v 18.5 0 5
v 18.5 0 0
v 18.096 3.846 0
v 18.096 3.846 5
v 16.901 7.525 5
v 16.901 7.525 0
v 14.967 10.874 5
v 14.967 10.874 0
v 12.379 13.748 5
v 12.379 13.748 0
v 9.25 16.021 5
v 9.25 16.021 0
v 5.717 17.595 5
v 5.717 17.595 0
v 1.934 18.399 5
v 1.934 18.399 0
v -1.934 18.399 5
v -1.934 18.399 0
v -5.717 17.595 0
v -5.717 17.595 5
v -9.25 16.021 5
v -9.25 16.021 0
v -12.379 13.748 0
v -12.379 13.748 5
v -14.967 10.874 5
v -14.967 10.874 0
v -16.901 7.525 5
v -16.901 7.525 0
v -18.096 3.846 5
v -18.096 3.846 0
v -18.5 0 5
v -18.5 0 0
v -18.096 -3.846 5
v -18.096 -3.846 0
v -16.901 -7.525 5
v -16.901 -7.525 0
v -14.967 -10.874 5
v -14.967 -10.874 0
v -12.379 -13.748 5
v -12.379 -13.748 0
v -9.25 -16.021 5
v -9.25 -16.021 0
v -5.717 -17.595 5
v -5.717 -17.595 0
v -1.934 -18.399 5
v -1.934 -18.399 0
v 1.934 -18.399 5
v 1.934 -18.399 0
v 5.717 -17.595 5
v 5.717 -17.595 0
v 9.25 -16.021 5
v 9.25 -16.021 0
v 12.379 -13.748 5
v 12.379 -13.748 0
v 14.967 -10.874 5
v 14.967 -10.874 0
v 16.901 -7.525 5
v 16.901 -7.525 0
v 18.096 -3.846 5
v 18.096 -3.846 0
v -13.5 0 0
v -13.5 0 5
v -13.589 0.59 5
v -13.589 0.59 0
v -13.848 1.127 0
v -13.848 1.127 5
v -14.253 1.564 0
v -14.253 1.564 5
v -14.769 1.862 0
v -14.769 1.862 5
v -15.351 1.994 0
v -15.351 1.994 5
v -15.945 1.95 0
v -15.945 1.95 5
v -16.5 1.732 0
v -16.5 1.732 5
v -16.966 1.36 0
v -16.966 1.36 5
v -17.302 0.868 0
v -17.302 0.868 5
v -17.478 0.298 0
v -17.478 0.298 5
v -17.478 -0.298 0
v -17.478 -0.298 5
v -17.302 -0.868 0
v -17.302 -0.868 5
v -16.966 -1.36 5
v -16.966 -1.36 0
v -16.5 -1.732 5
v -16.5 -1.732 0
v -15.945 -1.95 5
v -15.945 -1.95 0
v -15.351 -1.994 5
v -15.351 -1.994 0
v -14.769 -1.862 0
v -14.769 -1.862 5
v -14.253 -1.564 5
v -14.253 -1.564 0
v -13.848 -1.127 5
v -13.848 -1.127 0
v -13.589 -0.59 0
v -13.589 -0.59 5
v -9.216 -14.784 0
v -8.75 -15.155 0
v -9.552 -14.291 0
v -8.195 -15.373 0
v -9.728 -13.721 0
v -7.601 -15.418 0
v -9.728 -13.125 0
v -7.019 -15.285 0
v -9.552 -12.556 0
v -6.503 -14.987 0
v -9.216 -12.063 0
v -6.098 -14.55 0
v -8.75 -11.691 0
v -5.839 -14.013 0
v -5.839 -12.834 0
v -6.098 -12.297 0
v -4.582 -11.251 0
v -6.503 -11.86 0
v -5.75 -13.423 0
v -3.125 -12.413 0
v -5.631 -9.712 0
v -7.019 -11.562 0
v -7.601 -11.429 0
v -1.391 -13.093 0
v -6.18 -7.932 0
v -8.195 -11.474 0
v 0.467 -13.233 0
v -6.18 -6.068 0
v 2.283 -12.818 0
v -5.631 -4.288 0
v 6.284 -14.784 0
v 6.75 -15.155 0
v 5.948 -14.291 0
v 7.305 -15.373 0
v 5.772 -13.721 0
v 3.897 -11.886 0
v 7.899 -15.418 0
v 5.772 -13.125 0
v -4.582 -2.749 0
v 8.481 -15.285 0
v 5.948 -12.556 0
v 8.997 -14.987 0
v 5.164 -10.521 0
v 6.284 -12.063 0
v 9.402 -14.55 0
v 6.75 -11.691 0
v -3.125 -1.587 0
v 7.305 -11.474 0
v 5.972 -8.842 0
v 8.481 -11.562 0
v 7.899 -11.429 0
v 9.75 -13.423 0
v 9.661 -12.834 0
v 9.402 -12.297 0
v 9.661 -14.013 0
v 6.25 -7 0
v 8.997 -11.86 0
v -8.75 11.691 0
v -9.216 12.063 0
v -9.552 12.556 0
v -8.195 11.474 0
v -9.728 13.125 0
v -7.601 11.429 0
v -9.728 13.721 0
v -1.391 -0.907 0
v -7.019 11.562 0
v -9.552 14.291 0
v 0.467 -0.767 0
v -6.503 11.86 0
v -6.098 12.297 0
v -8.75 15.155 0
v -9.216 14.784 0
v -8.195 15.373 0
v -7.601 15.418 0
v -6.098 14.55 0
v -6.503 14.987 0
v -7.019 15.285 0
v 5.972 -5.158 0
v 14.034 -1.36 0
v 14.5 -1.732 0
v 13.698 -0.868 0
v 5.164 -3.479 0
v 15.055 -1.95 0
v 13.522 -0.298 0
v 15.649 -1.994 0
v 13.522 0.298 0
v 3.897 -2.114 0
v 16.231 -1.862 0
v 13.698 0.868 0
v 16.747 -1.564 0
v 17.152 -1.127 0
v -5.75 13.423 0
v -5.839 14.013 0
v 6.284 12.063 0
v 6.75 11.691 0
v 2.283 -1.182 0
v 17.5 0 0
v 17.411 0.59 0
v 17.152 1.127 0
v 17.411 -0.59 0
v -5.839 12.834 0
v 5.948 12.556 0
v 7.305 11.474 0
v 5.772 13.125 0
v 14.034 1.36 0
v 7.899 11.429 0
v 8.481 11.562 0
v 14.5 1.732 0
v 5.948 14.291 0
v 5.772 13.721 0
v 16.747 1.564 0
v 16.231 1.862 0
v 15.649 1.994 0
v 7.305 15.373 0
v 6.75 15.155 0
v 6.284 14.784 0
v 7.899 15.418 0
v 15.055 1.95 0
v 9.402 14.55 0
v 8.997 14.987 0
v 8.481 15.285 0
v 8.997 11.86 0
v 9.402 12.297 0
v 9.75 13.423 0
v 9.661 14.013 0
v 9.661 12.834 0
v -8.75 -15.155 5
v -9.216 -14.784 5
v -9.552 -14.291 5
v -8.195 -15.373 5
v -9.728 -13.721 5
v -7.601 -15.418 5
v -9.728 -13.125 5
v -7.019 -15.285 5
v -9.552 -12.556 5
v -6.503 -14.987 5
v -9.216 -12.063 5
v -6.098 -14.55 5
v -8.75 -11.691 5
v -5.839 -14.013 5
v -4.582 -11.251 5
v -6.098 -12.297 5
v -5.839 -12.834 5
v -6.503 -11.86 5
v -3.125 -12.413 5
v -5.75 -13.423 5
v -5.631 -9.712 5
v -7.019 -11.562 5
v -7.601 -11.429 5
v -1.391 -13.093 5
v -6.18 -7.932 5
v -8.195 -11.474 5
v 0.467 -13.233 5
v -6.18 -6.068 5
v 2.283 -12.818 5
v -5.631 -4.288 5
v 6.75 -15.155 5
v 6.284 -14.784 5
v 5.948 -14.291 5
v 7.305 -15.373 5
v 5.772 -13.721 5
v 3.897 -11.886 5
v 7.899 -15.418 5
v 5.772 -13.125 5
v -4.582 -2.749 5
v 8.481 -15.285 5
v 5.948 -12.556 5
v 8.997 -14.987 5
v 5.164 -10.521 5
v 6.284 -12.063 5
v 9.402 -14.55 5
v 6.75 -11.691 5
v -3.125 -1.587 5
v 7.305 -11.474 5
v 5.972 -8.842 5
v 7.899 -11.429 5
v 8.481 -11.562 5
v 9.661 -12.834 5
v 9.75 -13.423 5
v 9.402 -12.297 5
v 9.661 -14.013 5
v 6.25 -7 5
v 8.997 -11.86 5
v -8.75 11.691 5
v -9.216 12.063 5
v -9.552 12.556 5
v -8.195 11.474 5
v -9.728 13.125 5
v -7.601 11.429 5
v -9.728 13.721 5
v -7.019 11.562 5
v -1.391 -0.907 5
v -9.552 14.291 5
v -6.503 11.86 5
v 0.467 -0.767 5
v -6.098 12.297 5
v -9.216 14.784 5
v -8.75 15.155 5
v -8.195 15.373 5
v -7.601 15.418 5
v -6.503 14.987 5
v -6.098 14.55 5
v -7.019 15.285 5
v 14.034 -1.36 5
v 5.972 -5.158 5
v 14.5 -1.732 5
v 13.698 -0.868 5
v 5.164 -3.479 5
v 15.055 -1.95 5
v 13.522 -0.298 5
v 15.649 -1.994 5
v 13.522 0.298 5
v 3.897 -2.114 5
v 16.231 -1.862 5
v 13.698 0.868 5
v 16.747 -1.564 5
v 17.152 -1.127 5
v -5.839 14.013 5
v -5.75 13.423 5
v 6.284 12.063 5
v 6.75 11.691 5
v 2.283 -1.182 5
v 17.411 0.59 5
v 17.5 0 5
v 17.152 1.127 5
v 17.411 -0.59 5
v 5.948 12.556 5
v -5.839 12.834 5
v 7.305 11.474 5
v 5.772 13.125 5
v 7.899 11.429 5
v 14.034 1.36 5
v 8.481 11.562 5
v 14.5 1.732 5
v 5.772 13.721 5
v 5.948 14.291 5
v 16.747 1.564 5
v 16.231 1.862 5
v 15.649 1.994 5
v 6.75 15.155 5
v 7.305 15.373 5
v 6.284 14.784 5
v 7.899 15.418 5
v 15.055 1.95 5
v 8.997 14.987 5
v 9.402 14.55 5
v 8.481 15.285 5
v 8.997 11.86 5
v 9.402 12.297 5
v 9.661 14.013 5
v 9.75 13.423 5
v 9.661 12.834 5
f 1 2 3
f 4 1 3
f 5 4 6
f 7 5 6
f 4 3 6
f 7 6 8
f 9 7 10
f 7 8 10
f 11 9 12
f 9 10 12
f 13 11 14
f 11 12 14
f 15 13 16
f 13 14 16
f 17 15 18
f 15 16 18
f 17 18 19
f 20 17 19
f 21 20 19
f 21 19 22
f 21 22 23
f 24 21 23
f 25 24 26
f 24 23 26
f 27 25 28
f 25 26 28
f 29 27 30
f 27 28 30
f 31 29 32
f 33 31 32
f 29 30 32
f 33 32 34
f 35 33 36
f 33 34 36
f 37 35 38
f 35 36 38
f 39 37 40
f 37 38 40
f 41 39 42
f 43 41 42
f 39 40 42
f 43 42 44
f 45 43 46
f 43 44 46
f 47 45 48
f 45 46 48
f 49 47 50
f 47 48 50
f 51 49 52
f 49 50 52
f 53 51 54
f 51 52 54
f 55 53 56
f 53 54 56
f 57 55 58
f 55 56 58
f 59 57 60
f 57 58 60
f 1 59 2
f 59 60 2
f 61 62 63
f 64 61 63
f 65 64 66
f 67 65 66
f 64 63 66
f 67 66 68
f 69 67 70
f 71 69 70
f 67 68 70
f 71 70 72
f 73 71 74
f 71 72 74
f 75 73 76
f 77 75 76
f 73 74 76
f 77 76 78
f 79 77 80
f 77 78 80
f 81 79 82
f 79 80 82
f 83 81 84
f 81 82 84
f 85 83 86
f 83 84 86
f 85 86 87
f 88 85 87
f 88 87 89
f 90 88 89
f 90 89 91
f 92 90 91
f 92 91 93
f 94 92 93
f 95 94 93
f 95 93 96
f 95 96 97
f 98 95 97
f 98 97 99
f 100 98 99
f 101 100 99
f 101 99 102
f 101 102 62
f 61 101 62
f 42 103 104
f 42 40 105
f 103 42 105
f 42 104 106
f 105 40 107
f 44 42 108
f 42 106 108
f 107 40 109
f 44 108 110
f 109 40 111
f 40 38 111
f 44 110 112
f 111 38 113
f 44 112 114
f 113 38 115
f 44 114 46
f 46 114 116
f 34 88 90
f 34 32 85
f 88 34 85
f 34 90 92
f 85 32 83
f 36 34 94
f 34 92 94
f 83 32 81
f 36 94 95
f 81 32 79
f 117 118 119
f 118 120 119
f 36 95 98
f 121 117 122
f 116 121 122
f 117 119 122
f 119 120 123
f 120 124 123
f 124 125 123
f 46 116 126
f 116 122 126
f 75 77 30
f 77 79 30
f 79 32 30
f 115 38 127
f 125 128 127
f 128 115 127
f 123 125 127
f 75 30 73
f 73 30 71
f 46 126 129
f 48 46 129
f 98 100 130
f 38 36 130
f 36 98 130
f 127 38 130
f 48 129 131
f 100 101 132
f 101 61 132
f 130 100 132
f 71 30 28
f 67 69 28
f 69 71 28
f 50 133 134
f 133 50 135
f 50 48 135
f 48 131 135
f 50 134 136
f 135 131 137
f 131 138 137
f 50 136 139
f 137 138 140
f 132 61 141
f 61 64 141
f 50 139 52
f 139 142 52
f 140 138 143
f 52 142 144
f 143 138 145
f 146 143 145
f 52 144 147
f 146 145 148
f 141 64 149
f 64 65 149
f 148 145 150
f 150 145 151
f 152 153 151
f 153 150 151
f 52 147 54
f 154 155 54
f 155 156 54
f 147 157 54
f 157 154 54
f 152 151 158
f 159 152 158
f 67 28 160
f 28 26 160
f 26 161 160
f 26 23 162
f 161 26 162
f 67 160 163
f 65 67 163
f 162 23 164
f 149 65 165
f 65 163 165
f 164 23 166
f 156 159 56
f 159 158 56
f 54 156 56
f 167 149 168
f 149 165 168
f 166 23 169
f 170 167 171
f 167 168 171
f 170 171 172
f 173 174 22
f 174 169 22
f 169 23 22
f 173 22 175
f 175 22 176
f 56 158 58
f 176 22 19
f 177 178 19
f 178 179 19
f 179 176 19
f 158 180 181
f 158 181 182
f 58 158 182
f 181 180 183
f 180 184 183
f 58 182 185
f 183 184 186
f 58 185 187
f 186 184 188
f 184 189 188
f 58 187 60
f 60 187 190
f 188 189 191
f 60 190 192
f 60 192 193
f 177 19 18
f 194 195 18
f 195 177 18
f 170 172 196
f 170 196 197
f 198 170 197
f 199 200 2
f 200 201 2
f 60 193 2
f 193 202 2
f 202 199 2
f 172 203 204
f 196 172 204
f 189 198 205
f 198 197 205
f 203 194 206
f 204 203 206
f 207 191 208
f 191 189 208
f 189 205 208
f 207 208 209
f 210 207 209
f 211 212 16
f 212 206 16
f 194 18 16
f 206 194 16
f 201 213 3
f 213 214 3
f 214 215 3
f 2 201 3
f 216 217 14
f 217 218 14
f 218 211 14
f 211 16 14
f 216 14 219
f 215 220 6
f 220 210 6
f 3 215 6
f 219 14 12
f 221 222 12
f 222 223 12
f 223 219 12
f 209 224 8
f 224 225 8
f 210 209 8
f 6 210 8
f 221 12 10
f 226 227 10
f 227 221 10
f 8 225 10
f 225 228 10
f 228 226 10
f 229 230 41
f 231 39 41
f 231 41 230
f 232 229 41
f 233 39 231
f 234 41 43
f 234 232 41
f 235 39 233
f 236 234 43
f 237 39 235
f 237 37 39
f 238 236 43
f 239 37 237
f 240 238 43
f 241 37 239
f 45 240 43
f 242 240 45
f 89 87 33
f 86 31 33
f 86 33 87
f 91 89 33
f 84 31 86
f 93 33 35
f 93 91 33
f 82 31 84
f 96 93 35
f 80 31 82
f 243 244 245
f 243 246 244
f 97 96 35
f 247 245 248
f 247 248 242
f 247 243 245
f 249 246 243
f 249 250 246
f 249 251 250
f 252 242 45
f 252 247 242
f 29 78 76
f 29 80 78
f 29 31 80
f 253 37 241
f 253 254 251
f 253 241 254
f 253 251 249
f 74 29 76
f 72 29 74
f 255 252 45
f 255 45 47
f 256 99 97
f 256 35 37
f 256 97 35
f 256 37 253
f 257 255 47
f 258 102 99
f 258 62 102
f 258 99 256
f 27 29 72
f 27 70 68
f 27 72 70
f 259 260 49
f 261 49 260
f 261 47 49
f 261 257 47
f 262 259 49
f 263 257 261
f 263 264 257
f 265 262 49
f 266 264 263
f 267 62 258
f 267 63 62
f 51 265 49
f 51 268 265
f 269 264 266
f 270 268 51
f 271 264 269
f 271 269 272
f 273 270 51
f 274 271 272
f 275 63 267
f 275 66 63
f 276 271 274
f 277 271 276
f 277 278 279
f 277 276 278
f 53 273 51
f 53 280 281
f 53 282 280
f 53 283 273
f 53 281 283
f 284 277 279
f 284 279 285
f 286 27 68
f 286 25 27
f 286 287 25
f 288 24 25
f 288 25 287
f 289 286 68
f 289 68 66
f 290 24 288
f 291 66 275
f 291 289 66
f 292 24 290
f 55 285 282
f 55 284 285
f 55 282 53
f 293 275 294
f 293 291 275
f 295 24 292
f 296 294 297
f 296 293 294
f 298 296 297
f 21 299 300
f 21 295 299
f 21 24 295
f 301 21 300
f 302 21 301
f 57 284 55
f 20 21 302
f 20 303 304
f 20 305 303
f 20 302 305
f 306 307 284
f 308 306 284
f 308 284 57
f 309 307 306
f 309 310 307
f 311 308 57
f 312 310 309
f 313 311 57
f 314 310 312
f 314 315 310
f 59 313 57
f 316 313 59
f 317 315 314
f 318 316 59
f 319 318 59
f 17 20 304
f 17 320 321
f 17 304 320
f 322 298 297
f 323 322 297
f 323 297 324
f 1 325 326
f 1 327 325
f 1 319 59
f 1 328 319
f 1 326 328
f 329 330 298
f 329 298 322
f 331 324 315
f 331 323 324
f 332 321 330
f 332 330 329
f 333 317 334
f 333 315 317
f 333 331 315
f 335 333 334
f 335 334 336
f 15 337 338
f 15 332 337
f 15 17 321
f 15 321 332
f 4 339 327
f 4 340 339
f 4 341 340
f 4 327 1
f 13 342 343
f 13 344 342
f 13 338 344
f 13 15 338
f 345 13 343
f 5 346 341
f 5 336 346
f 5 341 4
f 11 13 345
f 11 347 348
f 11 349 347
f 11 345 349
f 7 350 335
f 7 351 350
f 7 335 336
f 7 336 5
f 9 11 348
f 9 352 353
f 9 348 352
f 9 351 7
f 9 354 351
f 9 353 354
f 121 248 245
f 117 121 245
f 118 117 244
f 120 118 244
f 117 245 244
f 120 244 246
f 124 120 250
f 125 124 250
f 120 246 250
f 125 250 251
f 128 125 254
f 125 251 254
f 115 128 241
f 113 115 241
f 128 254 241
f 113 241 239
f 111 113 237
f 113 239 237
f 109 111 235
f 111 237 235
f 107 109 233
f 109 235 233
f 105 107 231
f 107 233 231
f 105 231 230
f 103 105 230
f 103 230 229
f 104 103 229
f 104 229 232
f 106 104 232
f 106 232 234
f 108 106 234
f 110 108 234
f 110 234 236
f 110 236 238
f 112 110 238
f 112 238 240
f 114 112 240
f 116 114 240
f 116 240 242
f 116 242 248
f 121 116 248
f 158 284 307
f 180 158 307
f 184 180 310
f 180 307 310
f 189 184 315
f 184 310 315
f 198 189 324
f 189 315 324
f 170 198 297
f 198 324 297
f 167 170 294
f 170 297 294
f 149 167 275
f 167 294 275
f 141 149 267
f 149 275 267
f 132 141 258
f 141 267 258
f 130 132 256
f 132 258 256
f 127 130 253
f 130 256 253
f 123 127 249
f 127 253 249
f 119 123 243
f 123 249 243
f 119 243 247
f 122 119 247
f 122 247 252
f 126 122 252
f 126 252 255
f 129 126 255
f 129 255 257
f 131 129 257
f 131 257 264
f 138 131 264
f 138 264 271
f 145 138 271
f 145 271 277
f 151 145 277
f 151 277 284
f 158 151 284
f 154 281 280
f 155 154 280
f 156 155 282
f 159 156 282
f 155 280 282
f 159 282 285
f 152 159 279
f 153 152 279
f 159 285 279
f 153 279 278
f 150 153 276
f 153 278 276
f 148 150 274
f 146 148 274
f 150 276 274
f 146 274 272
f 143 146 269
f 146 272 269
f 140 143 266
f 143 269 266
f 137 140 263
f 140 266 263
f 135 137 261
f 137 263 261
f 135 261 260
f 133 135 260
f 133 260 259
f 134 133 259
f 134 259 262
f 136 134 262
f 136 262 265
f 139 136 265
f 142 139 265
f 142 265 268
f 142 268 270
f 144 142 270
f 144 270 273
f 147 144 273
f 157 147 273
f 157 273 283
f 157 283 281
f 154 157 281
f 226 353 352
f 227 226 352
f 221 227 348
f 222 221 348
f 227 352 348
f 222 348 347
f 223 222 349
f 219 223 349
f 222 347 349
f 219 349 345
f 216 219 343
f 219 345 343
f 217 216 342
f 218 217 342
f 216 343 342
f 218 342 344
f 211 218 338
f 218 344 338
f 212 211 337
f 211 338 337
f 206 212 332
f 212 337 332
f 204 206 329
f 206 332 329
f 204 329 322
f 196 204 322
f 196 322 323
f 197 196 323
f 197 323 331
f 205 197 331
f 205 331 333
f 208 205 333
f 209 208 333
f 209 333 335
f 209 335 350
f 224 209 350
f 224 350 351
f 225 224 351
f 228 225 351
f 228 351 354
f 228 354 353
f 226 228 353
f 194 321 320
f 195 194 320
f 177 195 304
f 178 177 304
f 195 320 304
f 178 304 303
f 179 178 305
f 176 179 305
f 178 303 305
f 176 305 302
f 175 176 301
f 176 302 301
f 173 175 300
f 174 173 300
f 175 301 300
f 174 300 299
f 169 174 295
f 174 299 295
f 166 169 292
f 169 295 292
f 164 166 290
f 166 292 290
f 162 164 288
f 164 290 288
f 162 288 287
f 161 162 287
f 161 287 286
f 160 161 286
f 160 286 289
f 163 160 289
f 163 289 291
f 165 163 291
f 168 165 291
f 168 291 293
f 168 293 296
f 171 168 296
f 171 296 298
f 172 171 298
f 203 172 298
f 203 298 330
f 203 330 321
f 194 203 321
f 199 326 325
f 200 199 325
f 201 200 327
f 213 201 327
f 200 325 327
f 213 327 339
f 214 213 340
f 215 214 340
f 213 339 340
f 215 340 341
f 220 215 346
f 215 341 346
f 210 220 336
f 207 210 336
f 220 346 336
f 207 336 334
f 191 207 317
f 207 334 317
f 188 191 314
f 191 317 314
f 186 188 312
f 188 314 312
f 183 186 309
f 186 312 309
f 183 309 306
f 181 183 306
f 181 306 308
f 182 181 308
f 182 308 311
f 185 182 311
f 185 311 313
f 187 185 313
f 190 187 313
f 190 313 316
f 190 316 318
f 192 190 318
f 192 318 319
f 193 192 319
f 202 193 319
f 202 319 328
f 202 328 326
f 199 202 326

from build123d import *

# Parameters (mm, degrees)
ESQUISSE1_R             = 18.5
BOSS_EXTRU_1_DEPTH      = 5
ESQUISSE2_R             = 2
ENL_V_MAT_EXTRU_1_DEPTH = 6
ESQUISSE3_R             = 6.25
ENL_V_MAT_EXTRU_2_DEPTH = 6


with BuildPart() as part:
    # Esquisse1 → Boss.-Extru.1 (new body)
    with BuildSketch(Plane.XY):
        Circle(ESQUISSE1_R)
    extrude(amount=BOSS_EXTRU_1_DEPTH)

    # Esquisse2 → Enlèv. mat.-Extru.1 (cut, through all)
    with BuildSketch(Plane.XY.offset(5)):
        with Locations((-15.5, 0)):
            Circle(ESQUISSE2_R)
        with Locations((15.5, 0)):
            Circle(ESQUISSE2_R)
        with Locations((7.75, -13.423393759)):
            Circle(ESQUISSE2_R)
        with Locations((-7.75, -13.423393759)):
            Circle(ESQUISSE2_R)
        with Locations((-7.75, 13.423393759)):
            Circle(ESQUISSE2_R)
        with Locations((7.75, 13.423393759)):
            Circle(ESQUISSE2_R)
    extrude(amount=-ENL_V_MAT_EXTRU_1_DEPTH, mode=Mode.SUBTRACT)

    # Esquisse3 → Enlèv. mat.-Extru.2 (cut, through all)
    with BuildSketch(Plane.XY.offset(5)):
        with Locations((0, -7)):
            Circle(ESQUISSE3_R)
    extrude(amount=-ENL_V_MAT_EXTRU_2_DEPTH, mode=Mode.SUBTRACT)


solid = part.part
